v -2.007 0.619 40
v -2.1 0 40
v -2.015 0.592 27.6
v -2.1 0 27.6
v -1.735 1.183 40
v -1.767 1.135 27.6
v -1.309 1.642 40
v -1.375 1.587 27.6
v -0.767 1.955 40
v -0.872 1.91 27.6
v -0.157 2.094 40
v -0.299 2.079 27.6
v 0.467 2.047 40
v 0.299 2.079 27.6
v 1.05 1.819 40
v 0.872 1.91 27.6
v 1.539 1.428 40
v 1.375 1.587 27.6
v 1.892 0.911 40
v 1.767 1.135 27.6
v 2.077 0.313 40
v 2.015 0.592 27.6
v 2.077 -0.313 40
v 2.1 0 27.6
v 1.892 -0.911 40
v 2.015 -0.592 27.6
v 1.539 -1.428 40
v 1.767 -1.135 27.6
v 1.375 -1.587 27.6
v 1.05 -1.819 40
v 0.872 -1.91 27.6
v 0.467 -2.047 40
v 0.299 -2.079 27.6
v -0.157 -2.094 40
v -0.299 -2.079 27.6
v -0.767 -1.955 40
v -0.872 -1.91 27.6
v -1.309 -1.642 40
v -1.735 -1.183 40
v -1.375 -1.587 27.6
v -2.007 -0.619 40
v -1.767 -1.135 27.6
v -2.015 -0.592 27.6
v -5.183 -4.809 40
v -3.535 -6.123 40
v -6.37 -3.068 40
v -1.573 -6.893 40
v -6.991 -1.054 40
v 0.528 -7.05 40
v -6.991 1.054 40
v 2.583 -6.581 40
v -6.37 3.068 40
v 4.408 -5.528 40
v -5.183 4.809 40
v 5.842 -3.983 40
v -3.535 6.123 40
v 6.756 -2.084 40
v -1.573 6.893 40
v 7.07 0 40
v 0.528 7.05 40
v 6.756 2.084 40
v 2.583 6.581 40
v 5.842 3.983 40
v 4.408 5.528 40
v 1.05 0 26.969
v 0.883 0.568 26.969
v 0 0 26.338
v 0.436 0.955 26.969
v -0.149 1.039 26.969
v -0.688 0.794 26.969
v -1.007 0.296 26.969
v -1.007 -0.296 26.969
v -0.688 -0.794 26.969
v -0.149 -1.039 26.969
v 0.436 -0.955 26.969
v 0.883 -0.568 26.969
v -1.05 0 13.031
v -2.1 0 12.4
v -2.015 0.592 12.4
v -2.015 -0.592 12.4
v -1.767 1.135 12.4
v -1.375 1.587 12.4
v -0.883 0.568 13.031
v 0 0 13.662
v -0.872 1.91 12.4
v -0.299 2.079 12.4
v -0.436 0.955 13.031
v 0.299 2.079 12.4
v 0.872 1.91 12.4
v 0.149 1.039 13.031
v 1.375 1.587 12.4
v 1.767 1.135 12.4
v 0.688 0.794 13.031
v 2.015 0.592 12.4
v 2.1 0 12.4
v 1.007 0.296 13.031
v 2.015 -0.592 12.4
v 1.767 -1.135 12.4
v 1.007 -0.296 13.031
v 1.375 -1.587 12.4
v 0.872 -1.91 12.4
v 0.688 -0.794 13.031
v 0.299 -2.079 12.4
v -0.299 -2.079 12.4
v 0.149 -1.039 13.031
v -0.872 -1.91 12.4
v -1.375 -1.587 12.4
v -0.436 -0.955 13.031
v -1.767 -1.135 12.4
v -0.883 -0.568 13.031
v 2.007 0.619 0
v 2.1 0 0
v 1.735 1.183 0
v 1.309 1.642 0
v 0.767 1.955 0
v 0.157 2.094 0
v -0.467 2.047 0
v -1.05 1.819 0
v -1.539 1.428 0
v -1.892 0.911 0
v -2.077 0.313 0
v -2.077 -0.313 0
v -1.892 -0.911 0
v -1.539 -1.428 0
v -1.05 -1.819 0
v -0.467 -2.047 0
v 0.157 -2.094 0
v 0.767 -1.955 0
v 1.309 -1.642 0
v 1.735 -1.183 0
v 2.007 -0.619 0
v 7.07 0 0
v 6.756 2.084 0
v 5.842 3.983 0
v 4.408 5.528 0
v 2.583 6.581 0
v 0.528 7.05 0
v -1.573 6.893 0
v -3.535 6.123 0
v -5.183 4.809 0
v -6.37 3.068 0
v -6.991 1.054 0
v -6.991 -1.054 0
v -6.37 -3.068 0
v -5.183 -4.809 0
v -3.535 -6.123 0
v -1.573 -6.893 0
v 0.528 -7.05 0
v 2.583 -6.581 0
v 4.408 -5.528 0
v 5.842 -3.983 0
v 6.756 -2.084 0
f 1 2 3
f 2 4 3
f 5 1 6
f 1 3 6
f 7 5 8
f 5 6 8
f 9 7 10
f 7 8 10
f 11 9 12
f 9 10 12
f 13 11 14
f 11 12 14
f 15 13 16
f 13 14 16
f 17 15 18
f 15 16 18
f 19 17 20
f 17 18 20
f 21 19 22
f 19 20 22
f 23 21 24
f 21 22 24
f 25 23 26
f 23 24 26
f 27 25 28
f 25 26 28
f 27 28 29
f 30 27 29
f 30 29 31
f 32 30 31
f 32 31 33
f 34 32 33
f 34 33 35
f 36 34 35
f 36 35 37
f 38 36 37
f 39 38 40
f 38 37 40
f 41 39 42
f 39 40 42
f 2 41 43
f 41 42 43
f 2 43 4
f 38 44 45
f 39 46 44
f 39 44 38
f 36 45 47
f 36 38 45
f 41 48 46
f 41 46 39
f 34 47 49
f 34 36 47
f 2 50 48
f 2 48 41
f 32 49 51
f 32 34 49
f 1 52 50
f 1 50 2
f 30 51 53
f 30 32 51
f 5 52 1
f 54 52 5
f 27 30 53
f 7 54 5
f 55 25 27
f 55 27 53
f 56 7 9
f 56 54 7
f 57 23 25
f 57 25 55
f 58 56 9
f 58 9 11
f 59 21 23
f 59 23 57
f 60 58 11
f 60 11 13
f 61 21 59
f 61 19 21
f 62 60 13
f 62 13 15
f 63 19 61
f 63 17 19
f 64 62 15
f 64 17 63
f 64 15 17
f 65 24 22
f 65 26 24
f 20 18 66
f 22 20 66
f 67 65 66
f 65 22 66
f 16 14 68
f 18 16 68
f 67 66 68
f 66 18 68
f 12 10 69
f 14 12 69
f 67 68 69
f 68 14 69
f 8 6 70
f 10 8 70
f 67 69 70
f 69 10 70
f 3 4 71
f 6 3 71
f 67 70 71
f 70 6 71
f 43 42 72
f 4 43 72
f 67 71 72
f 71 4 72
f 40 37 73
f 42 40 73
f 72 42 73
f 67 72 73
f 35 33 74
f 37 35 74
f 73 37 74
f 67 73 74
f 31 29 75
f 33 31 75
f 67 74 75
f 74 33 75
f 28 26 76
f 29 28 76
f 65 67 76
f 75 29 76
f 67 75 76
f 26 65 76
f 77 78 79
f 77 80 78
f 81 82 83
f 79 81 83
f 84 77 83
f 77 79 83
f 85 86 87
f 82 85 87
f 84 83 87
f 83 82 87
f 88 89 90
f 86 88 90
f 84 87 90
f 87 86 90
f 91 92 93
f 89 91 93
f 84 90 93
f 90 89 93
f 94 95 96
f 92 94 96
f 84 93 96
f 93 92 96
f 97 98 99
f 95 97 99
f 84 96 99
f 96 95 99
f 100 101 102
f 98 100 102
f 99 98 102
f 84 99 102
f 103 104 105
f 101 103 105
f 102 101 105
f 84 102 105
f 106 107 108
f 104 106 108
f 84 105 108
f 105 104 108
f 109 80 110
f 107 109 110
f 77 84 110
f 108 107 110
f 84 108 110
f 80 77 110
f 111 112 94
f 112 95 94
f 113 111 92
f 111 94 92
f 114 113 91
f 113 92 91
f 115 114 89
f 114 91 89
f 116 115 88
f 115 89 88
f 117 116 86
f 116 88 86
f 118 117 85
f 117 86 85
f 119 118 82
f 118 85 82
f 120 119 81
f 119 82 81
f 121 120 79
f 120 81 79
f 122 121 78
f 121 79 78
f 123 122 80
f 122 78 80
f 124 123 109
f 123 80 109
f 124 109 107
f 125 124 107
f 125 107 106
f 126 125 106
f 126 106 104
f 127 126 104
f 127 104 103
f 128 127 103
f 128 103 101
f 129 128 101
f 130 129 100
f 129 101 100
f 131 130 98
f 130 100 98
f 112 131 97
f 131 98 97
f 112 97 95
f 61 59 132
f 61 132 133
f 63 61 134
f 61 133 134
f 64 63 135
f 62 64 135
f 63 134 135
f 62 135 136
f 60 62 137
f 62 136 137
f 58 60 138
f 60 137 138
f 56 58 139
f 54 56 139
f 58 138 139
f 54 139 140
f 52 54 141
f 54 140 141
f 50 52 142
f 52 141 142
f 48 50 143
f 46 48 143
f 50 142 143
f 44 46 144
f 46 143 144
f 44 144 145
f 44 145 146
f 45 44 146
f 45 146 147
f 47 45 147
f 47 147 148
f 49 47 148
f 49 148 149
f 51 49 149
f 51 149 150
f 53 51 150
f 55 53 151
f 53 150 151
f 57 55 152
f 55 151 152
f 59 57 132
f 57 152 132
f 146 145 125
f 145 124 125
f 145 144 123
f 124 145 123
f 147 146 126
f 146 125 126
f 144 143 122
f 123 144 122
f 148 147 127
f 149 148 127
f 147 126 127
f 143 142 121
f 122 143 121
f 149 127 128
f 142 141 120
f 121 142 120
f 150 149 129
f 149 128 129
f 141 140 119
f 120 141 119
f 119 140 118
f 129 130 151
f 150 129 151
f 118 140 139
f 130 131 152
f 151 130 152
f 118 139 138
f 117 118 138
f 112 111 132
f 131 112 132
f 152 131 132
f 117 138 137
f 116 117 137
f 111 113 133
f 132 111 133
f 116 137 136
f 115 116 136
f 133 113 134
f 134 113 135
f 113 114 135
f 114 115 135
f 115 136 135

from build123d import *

# Parameters (mm, degrees)
SKETCH1_R                 = 7.07
BOSS_EXTRUDE1_DEPTH       = 40
M5X0_8_TAPPED_HOLE1_D     = 4.2
M5X0_8_TAPPED_HOLE1_DEPTH = 12.4
M5X0_8_TAPPED_HOLE1_TIP   = 1.2618073
M5X0_8_TAPPED_HOLE3_D     = 4.2
M5X0_8_TAPPED_HOLE3_DEPTH = 12.4
M5X0_8_TAPPED_HOLE3_TIP   = 1.2618073


with BuildPart() as part:
    # Sketch1 → Boss-Extrude1 (new body)
    with BuildSketch(Plane(origin=(0, 0, 0), x_dir=(0, 1, 0), z_dir=(0, 0, 1))):
        with Locations(Location((0, 0, 0), (0, 0, 270))):
            Circle(SKETCH1_R)
    extrude(amount=BOSS_EXTRUDE1_DEPTH)

    # M5x0.8 Tapped Hole1
    with Locations(Plane.XY.offset(40)):
        with Locations((0, 0)):
            Hole(M5X0_8_TAPPED_HOLE1_D / 2, depth=M5X0_8_TAPPED_HOLE1_DEPTH)
            with Locations((0, 0, -(M5X0_8_TAPPED_HOLE1_DEPTH + M5X0_8_TAPPED_HOLE1_TIP / 2))):  # 118° drill point
                Cone(0, M5X0_8_TAPPED_HOLE1_D / 2, M5X0_8_TAPPED_HOLE1_TIP, mode=Mode.SUBTRACT)

    # M5x0.8 Tapped Hole3
    with Locations(Plane(origin=(0, 0, 0), x_dir=(-1, 0, 0), z_dir=(0, 0, -1))):
        with Locations((0, 0)):
            Hole(M5X0_8_TAPPED_HOLE3_D / 2, depth=M5X0_8_TAPPED_HOLE3_DEPTH)
            with Locations((0, 0, -(M5X0_8_TAPPED_HOLE3_DEPTH + M5X0_8_TAPPED_HOLE3_TIP / 2))):  # 118° drill point
                Cone(0, M5X0_8_TAPPED_HOLE3_D / 2, M5X0_8_TAPPED_HOLE3_TIP, mode=Mode.SUBTRACT)


solid = part.part
